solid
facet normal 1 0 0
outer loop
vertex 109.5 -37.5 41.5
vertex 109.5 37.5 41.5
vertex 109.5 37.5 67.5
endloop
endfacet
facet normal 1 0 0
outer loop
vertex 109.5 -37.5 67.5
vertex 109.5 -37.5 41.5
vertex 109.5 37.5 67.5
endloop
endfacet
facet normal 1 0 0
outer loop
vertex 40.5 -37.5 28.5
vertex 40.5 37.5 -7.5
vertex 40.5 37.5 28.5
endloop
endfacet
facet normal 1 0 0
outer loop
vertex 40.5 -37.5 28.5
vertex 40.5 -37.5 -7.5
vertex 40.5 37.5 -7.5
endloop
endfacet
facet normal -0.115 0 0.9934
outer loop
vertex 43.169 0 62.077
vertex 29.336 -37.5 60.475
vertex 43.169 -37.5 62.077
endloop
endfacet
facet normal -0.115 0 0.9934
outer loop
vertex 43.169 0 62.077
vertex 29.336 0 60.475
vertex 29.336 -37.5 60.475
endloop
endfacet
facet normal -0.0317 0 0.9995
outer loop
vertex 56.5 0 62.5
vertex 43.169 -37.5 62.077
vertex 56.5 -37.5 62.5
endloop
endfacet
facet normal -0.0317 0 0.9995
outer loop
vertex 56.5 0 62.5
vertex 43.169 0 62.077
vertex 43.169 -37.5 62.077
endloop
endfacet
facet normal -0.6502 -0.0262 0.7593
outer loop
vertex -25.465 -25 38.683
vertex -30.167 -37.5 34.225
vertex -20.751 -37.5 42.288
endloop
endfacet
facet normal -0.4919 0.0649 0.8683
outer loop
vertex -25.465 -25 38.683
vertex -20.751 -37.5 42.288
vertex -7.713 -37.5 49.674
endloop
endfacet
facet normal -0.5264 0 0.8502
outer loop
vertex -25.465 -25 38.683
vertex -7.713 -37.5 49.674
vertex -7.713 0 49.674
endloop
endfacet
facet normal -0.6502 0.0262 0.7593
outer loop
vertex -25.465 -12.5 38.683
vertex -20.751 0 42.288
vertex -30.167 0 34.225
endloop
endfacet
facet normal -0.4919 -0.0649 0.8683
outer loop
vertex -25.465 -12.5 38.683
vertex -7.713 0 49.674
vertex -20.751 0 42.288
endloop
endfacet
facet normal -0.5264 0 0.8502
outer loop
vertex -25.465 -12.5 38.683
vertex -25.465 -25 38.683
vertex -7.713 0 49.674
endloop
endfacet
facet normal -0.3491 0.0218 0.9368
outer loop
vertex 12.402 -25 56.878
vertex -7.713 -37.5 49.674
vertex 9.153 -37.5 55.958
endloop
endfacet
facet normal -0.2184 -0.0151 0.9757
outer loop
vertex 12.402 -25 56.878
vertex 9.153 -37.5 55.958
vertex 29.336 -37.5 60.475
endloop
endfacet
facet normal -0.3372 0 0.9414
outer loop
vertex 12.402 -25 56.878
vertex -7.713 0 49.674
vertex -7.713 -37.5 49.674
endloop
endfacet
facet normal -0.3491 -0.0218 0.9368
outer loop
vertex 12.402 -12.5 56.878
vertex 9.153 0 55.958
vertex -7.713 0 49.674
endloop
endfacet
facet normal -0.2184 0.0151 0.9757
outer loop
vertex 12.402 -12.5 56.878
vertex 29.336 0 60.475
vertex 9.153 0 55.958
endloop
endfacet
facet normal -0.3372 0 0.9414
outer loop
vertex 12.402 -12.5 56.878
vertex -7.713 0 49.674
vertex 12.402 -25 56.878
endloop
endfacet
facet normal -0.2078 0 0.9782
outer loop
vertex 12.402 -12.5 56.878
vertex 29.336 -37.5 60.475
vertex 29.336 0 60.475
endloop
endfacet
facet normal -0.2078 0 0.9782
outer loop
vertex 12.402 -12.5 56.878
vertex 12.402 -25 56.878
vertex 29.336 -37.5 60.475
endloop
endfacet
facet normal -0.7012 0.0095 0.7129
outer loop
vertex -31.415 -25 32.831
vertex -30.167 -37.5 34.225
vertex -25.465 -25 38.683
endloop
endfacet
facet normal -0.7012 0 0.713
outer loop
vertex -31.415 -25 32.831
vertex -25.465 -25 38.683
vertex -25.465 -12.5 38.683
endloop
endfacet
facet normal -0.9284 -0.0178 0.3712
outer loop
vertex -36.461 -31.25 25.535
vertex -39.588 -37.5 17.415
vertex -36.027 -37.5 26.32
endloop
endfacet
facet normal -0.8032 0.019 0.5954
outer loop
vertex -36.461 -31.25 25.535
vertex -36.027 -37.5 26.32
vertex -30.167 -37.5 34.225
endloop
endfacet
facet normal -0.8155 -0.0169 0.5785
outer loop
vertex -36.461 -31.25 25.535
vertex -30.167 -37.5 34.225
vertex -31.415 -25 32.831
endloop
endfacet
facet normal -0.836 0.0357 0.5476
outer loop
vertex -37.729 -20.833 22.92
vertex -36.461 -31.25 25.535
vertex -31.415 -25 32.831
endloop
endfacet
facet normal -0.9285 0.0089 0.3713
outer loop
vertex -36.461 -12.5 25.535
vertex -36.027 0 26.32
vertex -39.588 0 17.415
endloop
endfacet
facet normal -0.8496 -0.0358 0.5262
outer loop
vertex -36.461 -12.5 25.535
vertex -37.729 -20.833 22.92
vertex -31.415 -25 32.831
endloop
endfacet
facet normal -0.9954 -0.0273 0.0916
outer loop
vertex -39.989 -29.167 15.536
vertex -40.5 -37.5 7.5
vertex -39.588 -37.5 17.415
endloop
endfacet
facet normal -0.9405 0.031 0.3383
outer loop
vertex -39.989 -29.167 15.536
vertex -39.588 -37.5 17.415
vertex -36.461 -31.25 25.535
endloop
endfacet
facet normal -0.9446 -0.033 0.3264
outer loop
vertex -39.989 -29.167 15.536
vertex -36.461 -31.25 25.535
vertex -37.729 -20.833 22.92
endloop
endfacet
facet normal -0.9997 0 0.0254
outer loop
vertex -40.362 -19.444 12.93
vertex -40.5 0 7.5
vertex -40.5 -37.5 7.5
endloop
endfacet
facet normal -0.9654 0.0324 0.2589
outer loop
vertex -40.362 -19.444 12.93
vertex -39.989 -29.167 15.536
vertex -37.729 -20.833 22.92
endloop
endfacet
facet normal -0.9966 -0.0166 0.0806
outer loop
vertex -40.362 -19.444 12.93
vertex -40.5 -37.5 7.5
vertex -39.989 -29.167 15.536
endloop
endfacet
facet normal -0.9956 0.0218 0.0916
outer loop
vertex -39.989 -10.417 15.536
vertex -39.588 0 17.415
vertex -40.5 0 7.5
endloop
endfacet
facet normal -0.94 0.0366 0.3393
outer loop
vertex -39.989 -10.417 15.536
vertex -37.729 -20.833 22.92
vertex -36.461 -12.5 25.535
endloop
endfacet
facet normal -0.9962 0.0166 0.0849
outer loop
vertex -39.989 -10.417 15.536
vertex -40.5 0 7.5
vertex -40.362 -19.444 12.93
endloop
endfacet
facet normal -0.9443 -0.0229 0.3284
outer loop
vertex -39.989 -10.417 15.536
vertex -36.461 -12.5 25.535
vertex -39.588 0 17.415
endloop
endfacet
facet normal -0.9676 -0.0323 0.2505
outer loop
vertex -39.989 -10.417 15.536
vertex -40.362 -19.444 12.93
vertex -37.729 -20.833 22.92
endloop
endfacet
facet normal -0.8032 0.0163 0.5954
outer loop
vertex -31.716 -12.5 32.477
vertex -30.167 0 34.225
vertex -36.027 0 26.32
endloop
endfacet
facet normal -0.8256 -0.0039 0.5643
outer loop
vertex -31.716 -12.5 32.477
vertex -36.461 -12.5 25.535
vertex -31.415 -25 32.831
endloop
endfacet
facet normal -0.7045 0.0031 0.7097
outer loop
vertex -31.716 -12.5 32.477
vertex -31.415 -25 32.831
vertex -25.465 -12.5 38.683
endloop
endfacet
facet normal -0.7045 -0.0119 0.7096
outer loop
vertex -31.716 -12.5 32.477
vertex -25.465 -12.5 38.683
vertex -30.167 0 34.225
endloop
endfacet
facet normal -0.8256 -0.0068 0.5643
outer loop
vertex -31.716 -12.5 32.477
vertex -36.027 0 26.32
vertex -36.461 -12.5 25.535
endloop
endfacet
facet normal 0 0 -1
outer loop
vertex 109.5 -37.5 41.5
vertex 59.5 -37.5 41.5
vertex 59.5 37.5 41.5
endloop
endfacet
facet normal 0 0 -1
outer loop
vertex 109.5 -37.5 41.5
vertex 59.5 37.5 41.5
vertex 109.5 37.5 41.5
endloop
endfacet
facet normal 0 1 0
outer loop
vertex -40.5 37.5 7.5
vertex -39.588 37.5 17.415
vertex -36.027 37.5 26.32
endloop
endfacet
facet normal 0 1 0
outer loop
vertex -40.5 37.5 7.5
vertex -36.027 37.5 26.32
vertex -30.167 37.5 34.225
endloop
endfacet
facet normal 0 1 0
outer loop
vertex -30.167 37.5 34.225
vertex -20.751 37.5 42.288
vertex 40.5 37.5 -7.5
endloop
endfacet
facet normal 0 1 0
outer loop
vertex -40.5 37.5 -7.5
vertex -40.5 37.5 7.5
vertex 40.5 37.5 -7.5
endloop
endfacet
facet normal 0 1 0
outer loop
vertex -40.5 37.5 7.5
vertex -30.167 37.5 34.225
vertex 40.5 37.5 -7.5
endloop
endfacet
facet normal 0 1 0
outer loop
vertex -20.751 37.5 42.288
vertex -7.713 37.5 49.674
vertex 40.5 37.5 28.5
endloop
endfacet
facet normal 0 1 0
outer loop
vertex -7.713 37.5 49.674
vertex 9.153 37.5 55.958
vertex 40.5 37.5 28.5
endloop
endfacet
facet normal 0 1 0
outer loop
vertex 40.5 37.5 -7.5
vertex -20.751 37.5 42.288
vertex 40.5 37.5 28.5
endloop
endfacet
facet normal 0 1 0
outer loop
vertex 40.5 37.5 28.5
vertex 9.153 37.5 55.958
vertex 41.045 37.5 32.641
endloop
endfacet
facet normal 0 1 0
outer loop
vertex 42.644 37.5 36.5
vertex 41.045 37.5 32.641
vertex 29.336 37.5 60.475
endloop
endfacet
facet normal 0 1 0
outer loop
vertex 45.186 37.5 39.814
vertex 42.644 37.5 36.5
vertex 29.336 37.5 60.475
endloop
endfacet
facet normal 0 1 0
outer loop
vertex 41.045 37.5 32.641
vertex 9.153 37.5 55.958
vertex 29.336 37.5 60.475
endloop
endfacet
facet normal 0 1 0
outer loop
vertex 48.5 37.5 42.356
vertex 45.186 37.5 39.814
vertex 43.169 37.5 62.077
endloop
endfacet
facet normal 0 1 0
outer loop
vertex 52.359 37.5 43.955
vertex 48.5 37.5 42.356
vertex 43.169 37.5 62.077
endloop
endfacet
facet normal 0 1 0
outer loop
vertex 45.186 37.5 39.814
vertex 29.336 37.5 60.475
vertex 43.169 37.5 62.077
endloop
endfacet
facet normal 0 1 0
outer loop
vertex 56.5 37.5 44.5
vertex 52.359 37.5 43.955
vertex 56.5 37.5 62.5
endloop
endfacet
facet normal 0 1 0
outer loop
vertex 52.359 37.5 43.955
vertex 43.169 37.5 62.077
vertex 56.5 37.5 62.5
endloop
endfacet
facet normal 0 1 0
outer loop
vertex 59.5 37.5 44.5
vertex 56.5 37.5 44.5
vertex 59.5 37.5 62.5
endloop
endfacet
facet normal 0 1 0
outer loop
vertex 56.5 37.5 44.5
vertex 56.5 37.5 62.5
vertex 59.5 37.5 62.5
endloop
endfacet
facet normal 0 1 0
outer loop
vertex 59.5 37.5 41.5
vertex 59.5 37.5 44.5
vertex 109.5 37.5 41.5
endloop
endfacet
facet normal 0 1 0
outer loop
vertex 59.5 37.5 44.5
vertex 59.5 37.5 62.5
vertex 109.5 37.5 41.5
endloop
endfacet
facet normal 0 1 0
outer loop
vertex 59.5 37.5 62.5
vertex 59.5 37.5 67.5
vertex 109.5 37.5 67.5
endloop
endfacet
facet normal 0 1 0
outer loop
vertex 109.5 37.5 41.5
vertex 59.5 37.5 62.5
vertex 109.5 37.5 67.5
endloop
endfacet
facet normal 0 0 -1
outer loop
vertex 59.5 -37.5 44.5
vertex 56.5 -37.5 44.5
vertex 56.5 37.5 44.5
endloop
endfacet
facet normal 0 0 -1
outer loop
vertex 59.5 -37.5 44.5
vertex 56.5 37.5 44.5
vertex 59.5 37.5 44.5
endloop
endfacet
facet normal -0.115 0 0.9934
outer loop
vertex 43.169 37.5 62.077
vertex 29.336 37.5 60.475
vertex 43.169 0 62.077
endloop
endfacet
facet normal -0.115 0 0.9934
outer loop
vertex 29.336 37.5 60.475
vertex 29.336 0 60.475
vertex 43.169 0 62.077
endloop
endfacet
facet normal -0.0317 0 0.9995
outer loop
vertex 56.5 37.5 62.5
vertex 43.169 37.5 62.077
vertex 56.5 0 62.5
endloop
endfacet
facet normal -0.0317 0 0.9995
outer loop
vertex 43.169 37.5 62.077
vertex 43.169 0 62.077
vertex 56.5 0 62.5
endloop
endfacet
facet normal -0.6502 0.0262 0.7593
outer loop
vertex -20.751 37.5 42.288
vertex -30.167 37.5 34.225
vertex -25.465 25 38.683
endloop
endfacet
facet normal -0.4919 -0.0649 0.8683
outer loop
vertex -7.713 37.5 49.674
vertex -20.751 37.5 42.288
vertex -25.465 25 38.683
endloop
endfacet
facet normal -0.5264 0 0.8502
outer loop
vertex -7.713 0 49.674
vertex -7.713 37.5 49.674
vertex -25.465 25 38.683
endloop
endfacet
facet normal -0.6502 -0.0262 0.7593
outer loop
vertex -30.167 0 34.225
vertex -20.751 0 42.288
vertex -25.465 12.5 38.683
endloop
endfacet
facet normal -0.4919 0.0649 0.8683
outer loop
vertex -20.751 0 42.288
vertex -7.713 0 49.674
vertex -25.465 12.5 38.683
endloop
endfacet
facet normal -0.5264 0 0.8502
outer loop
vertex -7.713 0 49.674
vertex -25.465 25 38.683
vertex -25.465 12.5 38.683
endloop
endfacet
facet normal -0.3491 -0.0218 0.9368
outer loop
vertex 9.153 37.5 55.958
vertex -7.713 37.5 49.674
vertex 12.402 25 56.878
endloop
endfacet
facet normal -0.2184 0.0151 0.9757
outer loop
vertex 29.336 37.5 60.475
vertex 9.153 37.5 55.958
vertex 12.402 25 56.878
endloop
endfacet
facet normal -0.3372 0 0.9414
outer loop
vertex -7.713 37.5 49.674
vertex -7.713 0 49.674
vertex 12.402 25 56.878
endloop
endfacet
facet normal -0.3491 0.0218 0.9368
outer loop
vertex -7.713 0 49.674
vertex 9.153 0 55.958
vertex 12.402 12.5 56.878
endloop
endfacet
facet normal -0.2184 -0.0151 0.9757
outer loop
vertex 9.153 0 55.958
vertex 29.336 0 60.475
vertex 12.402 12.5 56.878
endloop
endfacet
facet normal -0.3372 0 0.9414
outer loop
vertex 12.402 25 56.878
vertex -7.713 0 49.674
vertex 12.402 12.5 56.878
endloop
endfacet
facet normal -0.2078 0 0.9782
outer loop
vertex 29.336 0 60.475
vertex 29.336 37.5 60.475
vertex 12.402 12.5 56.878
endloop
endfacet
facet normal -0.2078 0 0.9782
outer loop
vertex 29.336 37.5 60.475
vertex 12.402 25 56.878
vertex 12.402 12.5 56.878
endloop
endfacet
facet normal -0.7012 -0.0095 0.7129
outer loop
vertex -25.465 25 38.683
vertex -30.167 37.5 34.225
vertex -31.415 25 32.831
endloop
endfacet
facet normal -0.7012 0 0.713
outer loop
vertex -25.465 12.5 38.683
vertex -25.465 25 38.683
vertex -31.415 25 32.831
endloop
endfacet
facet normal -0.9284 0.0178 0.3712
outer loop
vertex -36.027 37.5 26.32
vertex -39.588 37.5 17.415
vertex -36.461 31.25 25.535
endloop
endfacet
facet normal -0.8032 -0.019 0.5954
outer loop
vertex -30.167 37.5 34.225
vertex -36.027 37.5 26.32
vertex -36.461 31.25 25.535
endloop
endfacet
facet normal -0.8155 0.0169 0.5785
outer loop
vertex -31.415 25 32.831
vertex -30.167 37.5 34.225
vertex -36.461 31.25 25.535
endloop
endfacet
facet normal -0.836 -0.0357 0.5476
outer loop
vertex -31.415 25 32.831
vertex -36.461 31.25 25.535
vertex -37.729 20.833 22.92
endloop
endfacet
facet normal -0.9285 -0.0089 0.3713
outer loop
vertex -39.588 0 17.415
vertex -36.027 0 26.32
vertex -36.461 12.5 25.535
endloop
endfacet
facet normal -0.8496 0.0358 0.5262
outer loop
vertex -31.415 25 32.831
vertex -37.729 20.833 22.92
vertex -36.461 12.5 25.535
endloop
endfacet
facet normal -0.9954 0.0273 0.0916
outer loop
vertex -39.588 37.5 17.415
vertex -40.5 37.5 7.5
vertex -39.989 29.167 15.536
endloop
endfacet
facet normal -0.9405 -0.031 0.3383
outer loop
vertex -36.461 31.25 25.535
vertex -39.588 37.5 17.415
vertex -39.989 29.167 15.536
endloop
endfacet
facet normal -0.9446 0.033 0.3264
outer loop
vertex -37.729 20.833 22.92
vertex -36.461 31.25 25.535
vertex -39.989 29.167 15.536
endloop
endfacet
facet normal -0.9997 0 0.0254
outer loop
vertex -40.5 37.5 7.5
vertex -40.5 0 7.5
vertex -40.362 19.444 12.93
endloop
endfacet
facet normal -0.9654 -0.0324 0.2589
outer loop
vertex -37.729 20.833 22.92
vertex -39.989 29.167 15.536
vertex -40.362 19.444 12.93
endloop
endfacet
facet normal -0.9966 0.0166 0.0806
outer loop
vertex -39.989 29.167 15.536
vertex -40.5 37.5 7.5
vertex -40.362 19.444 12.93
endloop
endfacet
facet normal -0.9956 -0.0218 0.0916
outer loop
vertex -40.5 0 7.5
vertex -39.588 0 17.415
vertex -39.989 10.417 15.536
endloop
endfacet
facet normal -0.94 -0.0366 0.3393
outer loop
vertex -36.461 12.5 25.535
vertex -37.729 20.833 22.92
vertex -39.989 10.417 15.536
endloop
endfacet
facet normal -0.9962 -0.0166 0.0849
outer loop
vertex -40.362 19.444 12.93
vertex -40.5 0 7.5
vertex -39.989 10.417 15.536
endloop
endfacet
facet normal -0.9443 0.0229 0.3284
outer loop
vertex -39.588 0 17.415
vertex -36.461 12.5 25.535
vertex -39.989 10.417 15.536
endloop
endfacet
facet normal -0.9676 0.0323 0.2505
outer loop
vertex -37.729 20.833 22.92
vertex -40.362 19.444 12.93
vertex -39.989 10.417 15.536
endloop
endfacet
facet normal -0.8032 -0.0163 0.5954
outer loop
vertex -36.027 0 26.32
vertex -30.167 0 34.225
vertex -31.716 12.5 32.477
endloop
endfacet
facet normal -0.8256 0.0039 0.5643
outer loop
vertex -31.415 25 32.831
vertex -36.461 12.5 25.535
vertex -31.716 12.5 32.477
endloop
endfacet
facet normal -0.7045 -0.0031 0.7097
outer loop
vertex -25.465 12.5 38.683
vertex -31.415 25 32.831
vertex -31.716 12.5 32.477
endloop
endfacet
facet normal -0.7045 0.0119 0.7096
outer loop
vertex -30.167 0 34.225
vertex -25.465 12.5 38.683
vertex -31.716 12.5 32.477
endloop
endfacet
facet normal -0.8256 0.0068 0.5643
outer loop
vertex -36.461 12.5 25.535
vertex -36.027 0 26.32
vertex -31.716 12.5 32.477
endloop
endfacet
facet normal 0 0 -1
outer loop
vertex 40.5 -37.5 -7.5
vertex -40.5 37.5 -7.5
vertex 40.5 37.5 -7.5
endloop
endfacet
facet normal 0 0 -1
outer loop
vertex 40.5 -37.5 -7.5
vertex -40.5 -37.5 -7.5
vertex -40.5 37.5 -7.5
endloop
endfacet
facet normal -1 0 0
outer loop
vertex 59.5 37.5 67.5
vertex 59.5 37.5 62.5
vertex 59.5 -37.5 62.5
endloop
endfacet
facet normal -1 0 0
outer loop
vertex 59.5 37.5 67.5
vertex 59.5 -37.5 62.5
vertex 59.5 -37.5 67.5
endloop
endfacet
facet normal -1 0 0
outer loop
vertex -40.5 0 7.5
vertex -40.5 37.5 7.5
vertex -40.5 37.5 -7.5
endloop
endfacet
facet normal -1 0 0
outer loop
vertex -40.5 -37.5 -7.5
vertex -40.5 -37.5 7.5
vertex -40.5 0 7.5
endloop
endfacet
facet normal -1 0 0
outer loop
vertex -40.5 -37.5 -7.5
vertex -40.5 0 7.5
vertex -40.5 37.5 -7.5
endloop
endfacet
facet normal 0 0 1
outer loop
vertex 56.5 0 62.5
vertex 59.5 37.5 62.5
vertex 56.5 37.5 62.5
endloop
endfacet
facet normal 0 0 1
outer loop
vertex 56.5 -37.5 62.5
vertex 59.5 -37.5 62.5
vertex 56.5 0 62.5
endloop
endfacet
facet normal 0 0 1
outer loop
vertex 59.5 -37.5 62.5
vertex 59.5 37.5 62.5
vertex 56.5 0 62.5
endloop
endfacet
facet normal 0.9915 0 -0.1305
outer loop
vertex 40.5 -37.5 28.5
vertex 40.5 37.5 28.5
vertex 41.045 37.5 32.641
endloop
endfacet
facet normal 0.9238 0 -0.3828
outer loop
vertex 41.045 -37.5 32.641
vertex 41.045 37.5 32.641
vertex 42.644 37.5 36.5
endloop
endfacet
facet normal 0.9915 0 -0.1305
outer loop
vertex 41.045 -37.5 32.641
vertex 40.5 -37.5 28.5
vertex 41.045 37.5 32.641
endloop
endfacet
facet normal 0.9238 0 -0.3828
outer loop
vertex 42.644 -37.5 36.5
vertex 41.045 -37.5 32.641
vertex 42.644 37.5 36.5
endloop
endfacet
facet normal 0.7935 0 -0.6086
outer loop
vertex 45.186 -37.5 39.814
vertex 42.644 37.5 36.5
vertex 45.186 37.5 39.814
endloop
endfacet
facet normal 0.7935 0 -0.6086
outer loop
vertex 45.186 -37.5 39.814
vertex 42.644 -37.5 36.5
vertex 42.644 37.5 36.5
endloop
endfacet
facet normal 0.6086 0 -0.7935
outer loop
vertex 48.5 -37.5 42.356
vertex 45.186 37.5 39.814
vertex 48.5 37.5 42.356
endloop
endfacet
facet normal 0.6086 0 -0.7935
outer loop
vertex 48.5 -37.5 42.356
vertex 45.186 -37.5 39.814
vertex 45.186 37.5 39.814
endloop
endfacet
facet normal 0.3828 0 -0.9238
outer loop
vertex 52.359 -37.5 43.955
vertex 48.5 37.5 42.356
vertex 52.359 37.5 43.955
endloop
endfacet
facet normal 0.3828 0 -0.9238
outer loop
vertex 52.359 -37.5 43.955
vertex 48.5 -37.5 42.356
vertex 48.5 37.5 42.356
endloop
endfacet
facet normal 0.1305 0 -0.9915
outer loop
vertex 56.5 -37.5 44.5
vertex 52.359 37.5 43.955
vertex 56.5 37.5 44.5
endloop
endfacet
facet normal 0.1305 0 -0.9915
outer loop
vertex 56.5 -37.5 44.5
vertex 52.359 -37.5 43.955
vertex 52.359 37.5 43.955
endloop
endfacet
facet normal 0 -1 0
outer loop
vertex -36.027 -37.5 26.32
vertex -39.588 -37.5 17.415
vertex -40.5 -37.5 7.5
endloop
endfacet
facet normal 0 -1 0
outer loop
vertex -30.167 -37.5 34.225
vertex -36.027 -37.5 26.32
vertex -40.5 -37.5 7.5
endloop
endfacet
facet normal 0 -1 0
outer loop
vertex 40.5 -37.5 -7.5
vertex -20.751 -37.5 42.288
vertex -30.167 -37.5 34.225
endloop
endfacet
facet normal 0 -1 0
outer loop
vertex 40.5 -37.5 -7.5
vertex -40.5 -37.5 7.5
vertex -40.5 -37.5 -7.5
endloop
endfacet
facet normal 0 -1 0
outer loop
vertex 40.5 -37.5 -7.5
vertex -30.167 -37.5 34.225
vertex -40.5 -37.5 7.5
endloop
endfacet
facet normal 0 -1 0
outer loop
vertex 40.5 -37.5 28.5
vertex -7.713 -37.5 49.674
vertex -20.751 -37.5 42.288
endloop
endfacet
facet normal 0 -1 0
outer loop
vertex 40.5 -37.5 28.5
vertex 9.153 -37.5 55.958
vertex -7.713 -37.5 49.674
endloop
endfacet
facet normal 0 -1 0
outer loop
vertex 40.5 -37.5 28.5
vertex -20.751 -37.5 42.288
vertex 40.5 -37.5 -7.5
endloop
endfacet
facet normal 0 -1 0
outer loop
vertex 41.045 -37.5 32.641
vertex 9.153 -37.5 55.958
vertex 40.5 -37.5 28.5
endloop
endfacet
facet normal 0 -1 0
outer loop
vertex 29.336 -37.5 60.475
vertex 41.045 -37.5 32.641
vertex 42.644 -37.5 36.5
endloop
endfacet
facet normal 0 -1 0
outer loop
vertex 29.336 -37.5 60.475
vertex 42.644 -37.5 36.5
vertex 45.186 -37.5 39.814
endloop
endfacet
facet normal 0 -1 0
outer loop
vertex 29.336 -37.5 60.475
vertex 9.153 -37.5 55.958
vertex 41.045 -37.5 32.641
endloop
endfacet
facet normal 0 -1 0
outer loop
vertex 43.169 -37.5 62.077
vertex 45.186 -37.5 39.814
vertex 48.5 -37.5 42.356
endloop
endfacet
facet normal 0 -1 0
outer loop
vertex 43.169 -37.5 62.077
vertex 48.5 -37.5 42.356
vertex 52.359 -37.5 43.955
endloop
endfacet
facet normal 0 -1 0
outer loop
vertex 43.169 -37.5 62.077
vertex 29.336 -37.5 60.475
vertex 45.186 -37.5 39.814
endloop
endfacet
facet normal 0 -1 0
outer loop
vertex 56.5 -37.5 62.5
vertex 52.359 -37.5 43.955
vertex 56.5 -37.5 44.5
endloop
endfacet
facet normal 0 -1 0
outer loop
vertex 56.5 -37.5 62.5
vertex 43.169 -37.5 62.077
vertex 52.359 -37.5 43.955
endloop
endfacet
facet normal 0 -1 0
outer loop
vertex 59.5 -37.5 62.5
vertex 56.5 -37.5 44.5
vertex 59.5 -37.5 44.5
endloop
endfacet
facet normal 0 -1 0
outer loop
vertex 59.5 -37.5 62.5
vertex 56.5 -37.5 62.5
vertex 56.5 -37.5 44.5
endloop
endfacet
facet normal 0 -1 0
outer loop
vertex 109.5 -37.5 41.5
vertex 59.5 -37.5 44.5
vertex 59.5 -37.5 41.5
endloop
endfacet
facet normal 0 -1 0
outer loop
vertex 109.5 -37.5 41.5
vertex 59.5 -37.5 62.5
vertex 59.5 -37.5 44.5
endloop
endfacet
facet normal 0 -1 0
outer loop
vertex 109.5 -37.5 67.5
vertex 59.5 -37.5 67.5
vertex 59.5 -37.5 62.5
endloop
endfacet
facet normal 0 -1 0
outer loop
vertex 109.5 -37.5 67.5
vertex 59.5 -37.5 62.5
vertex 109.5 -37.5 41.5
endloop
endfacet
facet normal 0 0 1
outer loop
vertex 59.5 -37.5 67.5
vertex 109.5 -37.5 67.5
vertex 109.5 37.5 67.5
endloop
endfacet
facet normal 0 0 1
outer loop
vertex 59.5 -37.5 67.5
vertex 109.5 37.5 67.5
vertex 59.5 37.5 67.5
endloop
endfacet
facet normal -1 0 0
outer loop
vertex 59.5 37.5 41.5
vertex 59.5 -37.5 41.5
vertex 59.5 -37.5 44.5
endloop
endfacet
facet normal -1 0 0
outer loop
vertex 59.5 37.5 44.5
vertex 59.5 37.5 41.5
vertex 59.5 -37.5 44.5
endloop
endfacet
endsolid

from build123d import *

# Parameters (mm, degrees)
F0_W     = 25
F0_H     = 5
F0_H_2   = 18
F0_H_3   = 3
F1_DEPTH = 37.5


with BuildPart() as f1:
    # F0 (on Front) → F1 (new body, symmetric)
    with BuildSketch(Plane.XZ):
        with BuildLine():
            Line((-40.5, 7.5), (22.5, 7.5))
            Line((22.5, 7.5), (22.5, 28.5))
            ThreePointArc((22.5, 28.5), (32.4583694397, 52.5416305603), (56.5, 62.5))
            add(Edge.make_bspline(
                [(-40.5, 7.5), (-42.4130707979, 45.3152880073), (14.8186171427, 63.0258098245), (56.5, 62.5)],
                knots=[0, 0, 0, 0, 111.5078472575, 111.5078472575, 111.5078472575, 111.5078472575], degree=3))
        make_face()
        with BuildLine():
            Line((22.5, 7.5), (40.5, 7.5))
            Line((40.5, 7.5), (40.5, 28.5))
            ThreePointArc((40.5, 28.5), (45.186291501, 39.813708499), (56.5, 44.5))
            Line((56.5, 44.5), (59.5, 44.5))
            Line((59.5, 44.5), (59.5, 62.5))
            Line((59.5, 62.5), (56.5, 62.5))
            ThreePointArc((56.5, 62.5), (32.4583694397, 52.5416305603), (22.5, 28.5))
            Line((22.5, 28.5), (22.5, 7.5))
        make_face()
        with Locations((72, 65)):
            Rectangle(F0_W, F0_H)
        with Locations((72, 53.5)):
            Rectangle(F0_W, F0_H_2)
        with Locations((72, 43)):
            Rectangle(F0_W, F0_H_3)
        Polygon((84.5, 62.5), (84.5, 44.5), (84.5, 41.5), (109.5, 41.5), (109.5, 67.5), (84.5, 67.5), align=None)
        Polygon((40.5, -7.5), (40.5, 7.5), (22.5, 7.5), (-40.5, 7.5), (-40.5, -7.5), align=None)
    extrude(amount=F1_DEPTH, both=True)


solid = f1.part
